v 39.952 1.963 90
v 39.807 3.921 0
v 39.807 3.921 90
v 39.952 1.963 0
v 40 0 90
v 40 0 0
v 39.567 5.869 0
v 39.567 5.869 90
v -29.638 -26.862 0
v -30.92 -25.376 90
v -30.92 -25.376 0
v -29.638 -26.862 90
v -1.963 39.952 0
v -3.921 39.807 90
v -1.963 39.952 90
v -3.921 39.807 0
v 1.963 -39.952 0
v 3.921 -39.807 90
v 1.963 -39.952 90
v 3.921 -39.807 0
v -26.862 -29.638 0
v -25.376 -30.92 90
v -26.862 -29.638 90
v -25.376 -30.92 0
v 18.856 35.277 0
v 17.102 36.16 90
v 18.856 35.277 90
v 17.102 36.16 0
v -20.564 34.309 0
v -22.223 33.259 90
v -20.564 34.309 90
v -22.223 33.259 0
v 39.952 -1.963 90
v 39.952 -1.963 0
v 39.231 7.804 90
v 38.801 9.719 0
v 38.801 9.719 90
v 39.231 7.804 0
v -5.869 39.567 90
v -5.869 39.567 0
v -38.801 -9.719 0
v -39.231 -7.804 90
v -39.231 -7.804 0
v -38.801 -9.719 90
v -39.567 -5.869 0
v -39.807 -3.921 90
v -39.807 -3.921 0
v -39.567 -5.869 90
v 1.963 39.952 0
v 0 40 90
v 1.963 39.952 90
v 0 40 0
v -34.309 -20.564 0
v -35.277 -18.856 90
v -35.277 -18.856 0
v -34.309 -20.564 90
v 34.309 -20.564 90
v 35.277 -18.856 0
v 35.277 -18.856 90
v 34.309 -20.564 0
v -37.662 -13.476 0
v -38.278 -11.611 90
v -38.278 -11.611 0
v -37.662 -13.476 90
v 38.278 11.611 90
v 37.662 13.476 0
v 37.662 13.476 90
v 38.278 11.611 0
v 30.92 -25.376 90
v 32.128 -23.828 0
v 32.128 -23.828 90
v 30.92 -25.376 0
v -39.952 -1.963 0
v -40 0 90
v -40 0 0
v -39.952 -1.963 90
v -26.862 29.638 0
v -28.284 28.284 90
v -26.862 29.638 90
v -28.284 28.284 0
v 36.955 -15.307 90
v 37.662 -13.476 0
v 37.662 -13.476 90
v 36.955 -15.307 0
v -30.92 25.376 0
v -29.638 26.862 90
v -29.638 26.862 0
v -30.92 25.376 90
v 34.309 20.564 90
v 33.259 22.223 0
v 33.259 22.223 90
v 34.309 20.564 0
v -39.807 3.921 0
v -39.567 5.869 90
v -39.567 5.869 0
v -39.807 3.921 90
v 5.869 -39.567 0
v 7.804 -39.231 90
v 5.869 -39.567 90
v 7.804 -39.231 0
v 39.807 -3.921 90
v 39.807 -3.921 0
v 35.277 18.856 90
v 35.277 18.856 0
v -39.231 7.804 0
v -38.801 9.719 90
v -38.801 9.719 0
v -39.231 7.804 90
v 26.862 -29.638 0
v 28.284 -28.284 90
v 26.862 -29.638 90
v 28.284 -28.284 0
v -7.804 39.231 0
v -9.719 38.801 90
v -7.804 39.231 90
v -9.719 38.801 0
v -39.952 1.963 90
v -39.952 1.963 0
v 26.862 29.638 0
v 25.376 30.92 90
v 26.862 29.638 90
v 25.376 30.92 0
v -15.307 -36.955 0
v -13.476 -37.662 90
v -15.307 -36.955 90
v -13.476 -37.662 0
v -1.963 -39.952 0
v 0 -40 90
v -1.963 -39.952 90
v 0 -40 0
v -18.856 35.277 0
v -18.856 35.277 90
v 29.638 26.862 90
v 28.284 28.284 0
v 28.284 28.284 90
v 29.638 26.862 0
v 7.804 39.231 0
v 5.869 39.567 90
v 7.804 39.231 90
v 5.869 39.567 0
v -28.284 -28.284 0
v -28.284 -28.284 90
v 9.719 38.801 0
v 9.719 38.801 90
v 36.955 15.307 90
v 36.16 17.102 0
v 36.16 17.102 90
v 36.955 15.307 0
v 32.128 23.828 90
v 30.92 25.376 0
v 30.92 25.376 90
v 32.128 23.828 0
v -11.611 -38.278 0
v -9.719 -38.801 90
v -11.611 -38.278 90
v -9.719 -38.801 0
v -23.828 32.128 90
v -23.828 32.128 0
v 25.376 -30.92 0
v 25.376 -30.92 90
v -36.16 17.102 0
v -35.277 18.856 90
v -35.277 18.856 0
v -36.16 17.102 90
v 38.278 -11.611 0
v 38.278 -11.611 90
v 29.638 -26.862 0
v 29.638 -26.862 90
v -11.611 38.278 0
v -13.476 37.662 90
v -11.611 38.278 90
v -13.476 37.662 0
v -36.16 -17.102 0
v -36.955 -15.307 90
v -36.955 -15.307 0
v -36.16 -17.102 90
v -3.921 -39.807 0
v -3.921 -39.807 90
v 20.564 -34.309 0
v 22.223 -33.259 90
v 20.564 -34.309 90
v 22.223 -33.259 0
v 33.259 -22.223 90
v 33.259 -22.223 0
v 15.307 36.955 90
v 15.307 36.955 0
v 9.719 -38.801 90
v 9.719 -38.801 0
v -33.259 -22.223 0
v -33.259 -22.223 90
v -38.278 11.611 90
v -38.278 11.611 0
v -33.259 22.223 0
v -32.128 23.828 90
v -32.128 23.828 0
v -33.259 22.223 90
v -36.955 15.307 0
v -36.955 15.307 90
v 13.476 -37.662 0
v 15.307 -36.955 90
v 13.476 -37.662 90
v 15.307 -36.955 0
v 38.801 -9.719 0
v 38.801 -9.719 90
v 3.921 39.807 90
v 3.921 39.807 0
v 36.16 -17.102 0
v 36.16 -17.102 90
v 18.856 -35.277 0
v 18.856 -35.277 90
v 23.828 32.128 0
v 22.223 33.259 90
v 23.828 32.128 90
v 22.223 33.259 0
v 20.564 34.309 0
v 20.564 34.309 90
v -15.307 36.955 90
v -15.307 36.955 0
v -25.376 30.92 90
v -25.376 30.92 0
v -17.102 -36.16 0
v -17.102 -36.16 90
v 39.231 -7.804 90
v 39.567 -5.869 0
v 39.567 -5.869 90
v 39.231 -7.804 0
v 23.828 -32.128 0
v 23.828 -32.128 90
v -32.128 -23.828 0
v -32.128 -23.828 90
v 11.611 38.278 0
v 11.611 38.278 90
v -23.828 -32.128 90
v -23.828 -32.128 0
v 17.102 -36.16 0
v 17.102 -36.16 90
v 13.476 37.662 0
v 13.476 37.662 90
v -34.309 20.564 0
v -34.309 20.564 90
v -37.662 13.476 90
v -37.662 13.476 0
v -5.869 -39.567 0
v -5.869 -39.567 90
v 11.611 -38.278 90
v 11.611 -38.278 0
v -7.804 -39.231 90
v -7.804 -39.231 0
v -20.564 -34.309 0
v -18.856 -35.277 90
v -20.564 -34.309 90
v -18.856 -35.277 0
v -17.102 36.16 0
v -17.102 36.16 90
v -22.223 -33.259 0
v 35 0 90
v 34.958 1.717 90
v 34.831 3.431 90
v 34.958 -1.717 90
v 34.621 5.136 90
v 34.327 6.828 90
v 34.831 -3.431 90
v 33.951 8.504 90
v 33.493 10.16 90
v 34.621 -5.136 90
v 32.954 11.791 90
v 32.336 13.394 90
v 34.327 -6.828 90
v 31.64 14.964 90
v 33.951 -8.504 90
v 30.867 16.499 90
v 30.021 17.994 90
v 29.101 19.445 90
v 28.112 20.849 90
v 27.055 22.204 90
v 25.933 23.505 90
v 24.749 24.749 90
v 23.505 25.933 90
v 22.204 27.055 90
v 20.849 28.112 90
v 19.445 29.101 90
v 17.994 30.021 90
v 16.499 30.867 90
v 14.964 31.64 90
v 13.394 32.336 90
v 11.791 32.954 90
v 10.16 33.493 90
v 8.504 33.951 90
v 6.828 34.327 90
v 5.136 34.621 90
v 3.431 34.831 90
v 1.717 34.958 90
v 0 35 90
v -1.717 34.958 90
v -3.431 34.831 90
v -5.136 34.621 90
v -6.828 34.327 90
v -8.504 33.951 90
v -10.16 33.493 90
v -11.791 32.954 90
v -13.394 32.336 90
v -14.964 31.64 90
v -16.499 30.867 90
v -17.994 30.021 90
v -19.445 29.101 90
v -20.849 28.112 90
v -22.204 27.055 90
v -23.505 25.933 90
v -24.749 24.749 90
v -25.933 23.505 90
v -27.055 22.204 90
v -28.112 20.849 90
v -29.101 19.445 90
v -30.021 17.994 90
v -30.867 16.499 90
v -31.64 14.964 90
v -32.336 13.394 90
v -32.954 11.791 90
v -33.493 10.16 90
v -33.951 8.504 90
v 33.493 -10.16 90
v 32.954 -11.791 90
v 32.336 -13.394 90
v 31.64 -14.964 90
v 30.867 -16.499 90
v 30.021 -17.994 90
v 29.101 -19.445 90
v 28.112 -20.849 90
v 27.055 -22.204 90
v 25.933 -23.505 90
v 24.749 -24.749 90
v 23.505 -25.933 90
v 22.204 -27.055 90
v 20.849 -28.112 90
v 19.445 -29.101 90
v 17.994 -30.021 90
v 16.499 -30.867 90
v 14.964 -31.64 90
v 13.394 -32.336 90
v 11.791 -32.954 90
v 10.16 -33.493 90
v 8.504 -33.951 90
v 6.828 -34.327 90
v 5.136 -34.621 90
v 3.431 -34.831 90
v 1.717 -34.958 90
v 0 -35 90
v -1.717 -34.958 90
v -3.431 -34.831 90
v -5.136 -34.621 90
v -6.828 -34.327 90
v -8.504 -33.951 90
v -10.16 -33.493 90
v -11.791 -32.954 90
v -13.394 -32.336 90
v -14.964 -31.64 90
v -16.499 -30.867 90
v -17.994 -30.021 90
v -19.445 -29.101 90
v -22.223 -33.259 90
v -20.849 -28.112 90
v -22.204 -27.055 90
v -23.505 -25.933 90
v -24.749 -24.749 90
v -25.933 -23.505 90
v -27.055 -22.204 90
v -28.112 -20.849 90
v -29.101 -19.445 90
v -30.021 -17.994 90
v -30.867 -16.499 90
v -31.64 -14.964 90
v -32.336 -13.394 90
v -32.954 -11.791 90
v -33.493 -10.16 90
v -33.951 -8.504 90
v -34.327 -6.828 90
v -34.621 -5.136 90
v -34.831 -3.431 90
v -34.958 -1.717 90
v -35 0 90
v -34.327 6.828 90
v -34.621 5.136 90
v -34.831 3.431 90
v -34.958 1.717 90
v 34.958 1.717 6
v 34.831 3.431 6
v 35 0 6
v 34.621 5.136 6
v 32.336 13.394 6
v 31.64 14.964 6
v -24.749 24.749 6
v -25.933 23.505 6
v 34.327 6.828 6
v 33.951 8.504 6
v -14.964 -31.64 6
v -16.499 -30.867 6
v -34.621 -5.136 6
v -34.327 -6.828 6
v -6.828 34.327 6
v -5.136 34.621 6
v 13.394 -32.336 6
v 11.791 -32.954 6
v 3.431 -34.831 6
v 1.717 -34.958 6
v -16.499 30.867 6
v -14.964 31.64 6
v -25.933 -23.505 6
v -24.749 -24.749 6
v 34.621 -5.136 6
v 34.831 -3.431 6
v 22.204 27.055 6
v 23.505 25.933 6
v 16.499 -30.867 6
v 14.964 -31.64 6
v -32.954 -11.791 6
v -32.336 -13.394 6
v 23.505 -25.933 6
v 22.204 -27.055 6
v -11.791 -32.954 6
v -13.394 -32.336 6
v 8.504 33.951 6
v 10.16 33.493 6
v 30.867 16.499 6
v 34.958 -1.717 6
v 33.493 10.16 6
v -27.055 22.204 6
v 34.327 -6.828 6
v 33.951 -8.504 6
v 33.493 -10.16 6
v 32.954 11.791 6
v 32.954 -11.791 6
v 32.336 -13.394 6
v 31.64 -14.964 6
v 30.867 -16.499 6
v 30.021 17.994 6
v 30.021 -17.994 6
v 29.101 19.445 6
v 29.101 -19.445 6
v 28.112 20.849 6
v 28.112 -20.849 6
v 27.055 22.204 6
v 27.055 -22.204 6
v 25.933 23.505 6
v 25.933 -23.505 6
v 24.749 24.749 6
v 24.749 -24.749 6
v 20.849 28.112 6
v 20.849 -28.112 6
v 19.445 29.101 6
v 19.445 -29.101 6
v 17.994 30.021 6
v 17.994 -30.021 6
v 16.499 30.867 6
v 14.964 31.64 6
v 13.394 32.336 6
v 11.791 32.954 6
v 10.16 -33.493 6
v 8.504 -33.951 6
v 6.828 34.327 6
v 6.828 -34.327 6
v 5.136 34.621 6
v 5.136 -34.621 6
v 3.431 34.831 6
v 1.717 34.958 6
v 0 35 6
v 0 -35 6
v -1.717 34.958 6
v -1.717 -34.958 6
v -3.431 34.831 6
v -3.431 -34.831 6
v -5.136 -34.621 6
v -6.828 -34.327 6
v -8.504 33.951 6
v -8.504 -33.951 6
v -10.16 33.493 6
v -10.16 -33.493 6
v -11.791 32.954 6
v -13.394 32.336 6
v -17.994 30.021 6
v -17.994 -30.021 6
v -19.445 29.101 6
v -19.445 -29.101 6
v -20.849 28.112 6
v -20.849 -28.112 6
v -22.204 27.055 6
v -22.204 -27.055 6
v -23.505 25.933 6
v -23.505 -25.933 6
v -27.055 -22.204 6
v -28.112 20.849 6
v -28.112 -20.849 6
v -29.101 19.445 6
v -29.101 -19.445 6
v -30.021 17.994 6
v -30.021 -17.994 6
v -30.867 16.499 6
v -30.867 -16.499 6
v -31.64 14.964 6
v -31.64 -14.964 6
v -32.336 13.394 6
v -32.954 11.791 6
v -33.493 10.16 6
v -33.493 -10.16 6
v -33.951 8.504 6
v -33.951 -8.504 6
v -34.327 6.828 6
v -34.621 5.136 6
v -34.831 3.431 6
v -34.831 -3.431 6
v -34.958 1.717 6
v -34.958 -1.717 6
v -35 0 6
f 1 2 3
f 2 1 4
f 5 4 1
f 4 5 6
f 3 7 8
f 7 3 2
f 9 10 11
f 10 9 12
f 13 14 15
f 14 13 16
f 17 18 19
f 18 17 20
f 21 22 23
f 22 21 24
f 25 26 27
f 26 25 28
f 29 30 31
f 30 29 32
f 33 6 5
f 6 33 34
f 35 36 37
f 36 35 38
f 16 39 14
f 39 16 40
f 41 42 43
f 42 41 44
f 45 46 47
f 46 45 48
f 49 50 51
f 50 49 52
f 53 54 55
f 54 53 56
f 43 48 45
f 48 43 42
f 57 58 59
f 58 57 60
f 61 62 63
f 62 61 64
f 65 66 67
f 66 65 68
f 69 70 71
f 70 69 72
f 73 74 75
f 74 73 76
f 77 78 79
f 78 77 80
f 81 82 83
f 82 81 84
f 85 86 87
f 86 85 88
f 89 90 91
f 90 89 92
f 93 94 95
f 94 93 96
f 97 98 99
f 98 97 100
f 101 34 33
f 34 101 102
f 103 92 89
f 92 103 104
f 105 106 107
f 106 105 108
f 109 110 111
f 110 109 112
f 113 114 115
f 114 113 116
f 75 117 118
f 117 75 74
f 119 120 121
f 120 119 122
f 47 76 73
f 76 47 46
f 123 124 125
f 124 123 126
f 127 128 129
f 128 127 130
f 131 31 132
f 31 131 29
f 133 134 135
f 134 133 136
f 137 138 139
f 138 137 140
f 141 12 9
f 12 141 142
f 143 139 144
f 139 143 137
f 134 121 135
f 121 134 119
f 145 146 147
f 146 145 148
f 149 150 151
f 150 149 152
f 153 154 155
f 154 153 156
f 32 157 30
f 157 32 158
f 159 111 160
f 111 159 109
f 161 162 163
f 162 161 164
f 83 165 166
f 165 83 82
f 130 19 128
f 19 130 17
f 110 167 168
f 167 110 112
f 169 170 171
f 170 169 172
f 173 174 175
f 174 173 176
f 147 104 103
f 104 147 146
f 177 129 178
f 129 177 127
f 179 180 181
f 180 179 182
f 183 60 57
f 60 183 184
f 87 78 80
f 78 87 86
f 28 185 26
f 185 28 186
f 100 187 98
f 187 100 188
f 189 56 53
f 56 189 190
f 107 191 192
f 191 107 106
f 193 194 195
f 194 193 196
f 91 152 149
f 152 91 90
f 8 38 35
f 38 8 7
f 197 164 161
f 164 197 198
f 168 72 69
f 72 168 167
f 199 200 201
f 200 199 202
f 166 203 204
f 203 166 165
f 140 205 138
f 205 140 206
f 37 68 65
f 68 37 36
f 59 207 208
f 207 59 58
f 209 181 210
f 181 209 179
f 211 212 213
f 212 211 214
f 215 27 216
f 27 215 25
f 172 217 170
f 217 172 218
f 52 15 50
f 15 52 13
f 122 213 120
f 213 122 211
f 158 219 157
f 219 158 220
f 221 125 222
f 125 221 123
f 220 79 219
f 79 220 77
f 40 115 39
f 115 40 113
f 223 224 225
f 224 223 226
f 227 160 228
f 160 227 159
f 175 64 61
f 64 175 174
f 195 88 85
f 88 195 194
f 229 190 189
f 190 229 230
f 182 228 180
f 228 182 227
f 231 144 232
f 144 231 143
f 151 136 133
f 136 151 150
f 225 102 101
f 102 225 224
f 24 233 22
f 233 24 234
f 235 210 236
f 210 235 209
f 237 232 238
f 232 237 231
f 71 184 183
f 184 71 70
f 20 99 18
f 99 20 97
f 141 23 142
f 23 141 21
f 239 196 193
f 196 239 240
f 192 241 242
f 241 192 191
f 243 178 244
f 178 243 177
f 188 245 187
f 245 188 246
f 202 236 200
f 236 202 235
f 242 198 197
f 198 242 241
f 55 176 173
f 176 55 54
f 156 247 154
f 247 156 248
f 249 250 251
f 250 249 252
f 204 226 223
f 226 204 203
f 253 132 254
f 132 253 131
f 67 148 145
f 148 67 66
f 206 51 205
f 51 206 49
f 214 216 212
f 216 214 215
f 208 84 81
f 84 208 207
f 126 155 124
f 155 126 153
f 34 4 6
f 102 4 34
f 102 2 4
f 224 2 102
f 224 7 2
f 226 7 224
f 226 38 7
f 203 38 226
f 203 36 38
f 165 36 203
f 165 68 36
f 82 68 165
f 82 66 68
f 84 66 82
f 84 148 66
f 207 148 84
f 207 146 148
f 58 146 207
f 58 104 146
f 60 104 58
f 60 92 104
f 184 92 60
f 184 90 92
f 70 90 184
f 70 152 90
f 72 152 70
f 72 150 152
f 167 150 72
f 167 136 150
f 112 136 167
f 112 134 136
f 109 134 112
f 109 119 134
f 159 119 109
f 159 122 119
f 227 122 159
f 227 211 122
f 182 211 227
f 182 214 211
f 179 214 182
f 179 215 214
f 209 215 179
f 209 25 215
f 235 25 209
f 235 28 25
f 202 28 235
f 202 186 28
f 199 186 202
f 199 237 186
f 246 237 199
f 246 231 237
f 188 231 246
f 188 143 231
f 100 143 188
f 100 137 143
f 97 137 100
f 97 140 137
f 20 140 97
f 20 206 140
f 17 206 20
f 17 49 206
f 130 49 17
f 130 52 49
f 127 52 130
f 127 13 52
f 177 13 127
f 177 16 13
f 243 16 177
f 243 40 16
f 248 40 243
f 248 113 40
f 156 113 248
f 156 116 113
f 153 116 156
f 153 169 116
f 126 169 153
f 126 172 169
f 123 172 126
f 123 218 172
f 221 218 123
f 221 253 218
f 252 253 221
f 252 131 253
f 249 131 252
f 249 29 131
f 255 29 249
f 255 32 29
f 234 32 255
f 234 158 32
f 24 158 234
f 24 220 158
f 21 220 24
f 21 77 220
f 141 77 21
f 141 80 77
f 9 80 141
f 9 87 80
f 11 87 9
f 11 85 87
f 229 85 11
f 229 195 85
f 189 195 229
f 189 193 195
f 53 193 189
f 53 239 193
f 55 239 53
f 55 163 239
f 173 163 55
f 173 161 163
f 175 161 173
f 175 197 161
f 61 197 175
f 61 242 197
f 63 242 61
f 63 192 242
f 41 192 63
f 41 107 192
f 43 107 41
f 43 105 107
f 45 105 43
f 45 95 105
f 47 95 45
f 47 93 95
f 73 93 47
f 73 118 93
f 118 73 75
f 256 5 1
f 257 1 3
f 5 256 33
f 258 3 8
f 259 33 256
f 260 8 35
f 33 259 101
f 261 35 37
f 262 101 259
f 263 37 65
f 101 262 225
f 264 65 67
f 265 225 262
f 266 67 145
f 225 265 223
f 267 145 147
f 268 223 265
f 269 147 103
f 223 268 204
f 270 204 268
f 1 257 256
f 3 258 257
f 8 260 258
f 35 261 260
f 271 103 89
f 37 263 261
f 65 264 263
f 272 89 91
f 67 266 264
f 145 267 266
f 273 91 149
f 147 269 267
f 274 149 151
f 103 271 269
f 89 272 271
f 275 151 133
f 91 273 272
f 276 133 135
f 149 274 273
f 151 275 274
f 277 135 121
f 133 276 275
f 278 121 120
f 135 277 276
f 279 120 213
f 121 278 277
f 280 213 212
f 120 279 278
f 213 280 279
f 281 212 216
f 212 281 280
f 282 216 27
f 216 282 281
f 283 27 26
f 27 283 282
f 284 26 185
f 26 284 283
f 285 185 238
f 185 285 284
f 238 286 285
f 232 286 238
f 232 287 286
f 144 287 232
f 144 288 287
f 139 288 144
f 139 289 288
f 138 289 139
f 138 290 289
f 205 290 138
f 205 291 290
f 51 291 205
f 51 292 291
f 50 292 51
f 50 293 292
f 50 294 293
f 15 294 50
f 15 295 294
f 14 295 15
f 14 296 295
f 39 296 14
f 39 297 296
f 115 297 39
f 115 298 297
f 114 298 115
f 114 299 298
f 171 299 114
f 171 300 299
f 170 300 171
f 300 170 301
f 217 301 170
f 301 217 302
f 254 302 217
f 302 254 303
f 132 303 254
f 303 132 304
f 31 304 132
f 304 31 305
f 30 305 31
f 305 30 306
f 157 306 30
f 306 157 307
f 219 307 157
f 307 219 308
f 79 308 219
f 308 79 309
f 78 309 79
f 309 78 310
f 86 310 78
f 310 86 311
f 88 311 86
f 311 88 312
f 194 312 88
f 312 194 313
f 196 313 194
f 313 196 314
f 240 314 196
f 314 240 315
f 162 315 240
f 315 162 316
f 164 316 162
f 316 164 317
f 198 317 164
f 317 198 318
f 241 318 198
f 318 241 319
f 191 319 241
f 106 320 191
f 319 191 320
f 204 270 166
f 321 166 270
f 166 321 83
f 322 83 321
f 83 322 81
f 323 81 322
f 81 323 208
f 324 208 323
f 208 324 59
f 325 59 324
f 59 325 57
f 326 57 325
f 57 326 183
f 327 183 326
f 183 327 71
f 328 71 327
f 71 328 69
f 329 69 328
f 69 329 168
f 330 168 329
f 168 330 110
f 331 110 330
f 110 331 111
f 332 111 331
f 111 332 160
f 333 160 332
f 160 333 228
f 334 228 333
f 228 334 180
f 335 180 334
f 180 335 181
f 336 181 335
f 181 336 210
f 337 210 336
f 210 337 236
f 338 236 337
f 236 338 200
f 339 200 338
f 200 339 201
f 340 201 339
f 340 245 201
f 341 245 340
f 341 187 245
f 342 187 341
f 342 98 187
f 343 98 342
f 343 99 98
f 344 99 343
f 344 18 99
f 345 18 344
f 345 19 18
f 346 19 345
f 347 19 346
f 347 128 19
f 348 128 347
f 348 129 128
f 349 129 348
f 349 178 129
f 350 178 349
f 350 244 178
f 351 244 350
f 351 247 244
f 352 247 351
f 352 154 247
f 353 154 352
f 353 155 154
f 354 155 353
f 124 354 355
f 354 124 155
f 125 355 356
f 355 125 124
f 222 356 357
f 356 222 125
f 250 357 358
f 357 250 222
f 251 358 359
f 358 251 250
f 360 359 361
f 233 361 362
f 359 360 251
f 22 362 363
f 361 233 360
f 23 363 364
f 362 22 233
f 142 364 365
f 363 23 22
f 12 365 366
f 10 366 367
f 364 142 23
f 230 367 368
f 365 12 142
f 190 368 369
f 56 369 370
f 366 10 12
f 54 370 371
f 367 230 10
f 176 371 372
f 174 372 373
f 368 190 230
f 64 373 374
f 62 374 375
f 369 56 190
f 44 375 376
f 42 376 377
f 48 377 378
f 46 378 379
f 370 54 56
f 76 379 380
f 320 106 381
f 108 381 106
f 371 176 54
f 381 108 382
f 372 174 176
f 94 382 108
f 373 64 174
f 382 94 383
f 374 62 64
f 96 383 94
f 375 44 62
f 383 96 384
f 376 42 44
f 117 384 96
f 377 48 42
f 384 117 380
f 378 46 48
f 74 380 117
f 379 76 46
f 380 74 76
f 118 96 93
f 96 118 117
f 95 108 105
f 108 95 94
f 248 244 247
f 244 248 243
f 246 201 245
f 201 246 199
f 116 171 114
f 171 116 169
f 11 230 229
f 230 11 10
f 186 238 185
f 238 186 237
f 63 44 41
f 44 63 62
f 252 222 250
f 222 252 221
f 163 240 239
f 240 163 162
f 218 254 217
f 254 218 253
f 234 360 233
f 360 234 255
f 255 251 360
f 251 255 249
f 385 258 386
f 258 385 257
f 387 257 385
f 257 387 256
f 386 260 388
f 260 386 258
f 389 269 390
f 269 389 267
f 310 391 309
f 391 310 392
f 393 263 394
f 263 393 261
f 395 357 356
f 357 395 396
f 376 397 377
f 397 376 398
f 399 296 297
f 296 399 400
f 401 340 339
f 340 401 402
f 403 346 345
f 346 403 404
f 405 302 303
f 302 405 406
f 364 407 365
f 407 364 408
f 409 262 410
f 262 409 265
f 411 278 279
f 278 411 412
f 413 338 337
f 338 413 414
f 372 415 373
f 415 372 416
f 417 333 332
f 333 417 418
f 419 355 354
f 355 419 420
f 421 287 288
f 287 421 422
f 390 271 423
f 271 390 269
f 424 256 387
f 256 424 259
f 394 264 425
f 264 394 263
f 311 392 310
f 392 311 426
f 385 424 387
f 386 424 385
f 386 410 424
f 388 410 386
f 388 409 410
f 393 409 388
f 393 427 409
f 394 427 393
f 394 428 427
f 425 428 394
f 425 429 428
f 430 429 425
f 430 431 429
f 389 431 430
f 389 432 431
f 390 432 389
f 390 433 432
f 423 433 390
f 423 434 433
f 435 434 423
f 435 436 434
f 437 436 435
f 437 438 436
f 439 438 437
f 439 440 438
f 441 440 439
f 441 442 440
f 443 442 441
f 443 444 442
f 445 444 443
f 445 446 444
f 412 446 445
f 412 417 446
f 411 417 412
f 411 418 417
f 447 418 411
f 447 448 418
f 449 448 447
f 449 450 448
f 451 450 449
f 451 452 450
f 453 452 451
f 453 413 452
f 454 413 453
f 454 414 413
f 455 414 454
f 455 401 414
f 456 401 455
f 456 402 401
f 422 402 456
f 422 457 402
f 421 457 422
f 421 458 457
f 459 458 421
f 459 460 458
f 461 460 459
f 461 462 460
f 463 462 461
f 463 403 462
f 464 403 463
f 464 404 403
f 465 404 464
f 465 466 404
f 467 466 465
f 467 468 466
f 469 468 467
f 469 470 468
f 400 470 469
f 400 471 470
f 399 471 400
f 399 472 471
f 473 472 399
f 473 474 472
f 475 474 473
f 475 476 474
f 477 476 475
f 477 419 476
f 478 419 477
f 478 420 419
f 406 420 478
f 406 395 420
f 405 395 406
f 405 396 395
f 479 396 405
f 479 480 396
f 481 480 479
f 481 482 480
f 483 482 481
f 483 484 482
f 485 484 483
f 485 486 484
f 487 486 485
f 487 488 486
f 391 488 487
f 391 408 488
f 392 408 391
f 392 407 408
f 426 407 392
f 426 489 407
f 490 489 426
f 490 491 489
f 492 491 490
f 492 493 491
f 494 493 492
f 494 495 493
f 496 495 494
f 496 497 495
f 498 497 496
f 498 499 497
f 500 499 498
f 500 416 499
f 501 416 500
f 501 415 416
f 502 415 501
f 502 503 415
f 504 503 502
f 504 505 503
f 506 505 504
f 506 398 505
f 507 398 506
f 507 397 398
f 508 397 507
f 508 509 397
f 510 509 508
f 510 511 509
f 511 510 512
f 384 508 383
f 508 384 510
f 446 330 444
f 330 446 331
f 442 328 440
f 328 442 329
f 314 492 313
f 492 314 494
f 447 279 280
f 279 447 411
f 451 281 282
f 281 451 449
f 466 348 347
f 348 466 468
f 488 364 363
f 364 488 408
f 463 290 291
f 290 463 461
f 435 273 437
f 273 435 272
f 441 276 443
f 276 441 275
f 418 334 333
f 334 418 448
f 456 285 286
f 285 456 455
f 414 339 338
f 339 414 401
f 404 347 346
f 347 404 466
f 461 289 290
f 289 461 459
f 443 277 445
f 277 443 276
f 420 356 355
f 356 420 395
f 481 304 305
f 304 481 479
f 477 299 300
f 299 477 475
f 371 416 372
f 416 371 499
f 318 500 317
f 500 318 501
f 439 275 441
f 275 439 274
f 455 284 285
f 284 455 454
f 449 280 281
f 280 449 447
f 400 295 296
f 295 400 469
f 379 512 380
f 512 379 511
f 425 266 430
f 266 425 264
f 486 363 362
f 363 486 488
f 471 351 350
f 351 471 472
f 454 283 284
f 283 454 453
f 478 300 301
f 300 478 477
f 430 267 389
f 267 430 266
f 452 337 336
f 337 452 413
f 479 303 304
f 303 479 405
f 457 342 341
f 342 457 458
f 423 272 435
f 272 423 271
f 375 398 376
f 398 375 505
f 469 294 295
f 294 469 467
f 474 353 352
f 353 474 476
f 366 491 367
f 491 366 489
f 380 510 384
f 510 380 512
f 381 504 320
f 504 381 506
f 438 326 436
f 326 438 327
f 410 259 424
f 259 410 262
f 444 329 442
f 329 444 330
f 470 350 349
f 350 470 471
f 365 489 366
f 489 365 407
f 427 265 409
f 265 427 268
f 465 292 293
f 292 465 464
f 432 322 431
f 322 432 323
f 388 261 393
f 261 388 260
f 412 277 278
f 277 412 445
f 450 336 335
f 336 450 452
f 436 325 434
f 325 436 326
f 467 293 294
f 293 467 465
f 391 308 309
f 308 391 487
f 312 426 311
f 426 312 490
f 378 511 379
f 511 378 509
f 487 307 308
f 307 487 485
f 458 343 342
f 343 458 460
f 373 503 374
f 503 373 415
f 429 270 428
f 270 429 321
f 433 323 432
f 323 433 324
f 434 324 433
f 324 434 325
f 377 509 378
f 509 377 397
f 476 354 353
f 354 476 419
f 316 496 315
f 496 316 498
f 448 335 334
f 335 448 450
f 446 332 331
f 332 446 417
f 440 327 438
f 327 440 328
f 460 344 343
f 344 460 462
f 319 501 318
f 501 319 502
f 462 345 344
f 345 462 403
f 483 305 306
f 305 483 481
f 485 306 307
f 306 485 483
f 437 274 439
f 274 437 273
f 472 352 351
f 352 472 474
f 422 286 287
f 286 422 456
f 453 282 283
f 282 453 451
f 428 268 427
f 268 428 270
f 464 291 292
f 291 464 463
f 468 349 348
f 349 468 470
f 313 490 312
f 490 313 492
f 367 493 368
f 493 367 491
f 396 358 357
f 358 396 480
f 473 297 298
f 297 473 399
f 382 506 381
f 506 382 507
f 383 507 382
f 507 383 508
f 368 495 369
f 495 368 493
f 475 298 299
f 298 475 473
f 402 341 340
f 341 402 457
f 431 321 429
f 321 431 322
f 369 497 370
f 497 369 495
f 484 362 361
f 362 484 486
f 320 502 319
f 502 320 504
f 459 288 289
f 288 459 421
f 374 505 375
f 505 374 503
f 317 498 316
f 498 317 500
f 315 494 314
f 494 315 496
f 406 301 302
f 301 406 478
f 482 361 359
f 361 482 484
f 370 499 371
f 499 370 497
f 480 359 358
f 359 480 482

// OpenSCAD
// マグ本体パラメータ
mug_outer_diameter = 80;    // mm
mug_inner_diameter = 70;    // mm
mug_height = 90;            // mm
mug_wall_thickness = 5;     // mm
mug_bottom_thickness = 6;   // mm

// 取手パラメータ
handle_inner_height = 30;    // mm
handle_inner_width  = 25;    // mm
handle_thickness    = 12;    // mm  // 指が入りつつ頑丈さ優先

mug_radius = mug_outer_diameter / 2;
mug_inner_radius = mug_inner_diameter / 2;

// 取手スケッチ中心位置
handle_center_z = mug_height/2;

module mug_body() {
    difference() {
        cylinder(h = mug_height, r = mug_radius, $fn = 128);
        translate([0, 0, mug_bottom_thickness])
            cylinder(h = mug_height - mug_bottom_thickness, r = mug_inner_radius, $fn = 128);
    }
}

module handle_D() {
    // D字断面の外周
    inner_r = handle_inner_height/2;  // D字の半円内半径
    outer_r = inner_r + handle_thickness;

    // D字2Dプロファイル
    //   左辺(本体接触)が直線、右辺が半円
    handle_profile = 
        concat( // 下から上への直線
            [ [0, -inner_r], [0, inner_r] ],
            [ for (a = [90 : -1 : -90])
                [handle_inner_width/2 + inner_r * cos(a), inner_r * sin(a)] ],
            [ [handle_inner_width, -inner_r] ]
        );
    // 外周も同様にオフセット
    handle_outer_profile = 
        concat(
            [ [0, -outer_r], [0, outer_r] ],
            [ for (a = [90 : -1 : -90]) 
                  [handle_inner_width/2 + outer_r * cos(a), outer_r * sin(a)] ],
            [ [handle_inner_width, -outer_r] ]
        );
    // 2Dハンドル断面
    polygon(
        concat(
            handle_outer_profile,
            [for (i = [len(handle_profile)-1 : -1 : 0]) handle_profile[i]] // 内周を逆順で結ぶ
        )
    );
}

// 実体化
union() {
    mug_body();

    // 取手: X軸方向に平行で、マグ高さ中央に配置
    translate([mug_radius, 0, handle_center_z])  // 本体外周に密着
        rotate([90,0,0])  // 平面をY-Zに（マグ円筒に垂直に）
        linear_extrude(height=handle_inner_width, center=true)
            handle_D();
}
